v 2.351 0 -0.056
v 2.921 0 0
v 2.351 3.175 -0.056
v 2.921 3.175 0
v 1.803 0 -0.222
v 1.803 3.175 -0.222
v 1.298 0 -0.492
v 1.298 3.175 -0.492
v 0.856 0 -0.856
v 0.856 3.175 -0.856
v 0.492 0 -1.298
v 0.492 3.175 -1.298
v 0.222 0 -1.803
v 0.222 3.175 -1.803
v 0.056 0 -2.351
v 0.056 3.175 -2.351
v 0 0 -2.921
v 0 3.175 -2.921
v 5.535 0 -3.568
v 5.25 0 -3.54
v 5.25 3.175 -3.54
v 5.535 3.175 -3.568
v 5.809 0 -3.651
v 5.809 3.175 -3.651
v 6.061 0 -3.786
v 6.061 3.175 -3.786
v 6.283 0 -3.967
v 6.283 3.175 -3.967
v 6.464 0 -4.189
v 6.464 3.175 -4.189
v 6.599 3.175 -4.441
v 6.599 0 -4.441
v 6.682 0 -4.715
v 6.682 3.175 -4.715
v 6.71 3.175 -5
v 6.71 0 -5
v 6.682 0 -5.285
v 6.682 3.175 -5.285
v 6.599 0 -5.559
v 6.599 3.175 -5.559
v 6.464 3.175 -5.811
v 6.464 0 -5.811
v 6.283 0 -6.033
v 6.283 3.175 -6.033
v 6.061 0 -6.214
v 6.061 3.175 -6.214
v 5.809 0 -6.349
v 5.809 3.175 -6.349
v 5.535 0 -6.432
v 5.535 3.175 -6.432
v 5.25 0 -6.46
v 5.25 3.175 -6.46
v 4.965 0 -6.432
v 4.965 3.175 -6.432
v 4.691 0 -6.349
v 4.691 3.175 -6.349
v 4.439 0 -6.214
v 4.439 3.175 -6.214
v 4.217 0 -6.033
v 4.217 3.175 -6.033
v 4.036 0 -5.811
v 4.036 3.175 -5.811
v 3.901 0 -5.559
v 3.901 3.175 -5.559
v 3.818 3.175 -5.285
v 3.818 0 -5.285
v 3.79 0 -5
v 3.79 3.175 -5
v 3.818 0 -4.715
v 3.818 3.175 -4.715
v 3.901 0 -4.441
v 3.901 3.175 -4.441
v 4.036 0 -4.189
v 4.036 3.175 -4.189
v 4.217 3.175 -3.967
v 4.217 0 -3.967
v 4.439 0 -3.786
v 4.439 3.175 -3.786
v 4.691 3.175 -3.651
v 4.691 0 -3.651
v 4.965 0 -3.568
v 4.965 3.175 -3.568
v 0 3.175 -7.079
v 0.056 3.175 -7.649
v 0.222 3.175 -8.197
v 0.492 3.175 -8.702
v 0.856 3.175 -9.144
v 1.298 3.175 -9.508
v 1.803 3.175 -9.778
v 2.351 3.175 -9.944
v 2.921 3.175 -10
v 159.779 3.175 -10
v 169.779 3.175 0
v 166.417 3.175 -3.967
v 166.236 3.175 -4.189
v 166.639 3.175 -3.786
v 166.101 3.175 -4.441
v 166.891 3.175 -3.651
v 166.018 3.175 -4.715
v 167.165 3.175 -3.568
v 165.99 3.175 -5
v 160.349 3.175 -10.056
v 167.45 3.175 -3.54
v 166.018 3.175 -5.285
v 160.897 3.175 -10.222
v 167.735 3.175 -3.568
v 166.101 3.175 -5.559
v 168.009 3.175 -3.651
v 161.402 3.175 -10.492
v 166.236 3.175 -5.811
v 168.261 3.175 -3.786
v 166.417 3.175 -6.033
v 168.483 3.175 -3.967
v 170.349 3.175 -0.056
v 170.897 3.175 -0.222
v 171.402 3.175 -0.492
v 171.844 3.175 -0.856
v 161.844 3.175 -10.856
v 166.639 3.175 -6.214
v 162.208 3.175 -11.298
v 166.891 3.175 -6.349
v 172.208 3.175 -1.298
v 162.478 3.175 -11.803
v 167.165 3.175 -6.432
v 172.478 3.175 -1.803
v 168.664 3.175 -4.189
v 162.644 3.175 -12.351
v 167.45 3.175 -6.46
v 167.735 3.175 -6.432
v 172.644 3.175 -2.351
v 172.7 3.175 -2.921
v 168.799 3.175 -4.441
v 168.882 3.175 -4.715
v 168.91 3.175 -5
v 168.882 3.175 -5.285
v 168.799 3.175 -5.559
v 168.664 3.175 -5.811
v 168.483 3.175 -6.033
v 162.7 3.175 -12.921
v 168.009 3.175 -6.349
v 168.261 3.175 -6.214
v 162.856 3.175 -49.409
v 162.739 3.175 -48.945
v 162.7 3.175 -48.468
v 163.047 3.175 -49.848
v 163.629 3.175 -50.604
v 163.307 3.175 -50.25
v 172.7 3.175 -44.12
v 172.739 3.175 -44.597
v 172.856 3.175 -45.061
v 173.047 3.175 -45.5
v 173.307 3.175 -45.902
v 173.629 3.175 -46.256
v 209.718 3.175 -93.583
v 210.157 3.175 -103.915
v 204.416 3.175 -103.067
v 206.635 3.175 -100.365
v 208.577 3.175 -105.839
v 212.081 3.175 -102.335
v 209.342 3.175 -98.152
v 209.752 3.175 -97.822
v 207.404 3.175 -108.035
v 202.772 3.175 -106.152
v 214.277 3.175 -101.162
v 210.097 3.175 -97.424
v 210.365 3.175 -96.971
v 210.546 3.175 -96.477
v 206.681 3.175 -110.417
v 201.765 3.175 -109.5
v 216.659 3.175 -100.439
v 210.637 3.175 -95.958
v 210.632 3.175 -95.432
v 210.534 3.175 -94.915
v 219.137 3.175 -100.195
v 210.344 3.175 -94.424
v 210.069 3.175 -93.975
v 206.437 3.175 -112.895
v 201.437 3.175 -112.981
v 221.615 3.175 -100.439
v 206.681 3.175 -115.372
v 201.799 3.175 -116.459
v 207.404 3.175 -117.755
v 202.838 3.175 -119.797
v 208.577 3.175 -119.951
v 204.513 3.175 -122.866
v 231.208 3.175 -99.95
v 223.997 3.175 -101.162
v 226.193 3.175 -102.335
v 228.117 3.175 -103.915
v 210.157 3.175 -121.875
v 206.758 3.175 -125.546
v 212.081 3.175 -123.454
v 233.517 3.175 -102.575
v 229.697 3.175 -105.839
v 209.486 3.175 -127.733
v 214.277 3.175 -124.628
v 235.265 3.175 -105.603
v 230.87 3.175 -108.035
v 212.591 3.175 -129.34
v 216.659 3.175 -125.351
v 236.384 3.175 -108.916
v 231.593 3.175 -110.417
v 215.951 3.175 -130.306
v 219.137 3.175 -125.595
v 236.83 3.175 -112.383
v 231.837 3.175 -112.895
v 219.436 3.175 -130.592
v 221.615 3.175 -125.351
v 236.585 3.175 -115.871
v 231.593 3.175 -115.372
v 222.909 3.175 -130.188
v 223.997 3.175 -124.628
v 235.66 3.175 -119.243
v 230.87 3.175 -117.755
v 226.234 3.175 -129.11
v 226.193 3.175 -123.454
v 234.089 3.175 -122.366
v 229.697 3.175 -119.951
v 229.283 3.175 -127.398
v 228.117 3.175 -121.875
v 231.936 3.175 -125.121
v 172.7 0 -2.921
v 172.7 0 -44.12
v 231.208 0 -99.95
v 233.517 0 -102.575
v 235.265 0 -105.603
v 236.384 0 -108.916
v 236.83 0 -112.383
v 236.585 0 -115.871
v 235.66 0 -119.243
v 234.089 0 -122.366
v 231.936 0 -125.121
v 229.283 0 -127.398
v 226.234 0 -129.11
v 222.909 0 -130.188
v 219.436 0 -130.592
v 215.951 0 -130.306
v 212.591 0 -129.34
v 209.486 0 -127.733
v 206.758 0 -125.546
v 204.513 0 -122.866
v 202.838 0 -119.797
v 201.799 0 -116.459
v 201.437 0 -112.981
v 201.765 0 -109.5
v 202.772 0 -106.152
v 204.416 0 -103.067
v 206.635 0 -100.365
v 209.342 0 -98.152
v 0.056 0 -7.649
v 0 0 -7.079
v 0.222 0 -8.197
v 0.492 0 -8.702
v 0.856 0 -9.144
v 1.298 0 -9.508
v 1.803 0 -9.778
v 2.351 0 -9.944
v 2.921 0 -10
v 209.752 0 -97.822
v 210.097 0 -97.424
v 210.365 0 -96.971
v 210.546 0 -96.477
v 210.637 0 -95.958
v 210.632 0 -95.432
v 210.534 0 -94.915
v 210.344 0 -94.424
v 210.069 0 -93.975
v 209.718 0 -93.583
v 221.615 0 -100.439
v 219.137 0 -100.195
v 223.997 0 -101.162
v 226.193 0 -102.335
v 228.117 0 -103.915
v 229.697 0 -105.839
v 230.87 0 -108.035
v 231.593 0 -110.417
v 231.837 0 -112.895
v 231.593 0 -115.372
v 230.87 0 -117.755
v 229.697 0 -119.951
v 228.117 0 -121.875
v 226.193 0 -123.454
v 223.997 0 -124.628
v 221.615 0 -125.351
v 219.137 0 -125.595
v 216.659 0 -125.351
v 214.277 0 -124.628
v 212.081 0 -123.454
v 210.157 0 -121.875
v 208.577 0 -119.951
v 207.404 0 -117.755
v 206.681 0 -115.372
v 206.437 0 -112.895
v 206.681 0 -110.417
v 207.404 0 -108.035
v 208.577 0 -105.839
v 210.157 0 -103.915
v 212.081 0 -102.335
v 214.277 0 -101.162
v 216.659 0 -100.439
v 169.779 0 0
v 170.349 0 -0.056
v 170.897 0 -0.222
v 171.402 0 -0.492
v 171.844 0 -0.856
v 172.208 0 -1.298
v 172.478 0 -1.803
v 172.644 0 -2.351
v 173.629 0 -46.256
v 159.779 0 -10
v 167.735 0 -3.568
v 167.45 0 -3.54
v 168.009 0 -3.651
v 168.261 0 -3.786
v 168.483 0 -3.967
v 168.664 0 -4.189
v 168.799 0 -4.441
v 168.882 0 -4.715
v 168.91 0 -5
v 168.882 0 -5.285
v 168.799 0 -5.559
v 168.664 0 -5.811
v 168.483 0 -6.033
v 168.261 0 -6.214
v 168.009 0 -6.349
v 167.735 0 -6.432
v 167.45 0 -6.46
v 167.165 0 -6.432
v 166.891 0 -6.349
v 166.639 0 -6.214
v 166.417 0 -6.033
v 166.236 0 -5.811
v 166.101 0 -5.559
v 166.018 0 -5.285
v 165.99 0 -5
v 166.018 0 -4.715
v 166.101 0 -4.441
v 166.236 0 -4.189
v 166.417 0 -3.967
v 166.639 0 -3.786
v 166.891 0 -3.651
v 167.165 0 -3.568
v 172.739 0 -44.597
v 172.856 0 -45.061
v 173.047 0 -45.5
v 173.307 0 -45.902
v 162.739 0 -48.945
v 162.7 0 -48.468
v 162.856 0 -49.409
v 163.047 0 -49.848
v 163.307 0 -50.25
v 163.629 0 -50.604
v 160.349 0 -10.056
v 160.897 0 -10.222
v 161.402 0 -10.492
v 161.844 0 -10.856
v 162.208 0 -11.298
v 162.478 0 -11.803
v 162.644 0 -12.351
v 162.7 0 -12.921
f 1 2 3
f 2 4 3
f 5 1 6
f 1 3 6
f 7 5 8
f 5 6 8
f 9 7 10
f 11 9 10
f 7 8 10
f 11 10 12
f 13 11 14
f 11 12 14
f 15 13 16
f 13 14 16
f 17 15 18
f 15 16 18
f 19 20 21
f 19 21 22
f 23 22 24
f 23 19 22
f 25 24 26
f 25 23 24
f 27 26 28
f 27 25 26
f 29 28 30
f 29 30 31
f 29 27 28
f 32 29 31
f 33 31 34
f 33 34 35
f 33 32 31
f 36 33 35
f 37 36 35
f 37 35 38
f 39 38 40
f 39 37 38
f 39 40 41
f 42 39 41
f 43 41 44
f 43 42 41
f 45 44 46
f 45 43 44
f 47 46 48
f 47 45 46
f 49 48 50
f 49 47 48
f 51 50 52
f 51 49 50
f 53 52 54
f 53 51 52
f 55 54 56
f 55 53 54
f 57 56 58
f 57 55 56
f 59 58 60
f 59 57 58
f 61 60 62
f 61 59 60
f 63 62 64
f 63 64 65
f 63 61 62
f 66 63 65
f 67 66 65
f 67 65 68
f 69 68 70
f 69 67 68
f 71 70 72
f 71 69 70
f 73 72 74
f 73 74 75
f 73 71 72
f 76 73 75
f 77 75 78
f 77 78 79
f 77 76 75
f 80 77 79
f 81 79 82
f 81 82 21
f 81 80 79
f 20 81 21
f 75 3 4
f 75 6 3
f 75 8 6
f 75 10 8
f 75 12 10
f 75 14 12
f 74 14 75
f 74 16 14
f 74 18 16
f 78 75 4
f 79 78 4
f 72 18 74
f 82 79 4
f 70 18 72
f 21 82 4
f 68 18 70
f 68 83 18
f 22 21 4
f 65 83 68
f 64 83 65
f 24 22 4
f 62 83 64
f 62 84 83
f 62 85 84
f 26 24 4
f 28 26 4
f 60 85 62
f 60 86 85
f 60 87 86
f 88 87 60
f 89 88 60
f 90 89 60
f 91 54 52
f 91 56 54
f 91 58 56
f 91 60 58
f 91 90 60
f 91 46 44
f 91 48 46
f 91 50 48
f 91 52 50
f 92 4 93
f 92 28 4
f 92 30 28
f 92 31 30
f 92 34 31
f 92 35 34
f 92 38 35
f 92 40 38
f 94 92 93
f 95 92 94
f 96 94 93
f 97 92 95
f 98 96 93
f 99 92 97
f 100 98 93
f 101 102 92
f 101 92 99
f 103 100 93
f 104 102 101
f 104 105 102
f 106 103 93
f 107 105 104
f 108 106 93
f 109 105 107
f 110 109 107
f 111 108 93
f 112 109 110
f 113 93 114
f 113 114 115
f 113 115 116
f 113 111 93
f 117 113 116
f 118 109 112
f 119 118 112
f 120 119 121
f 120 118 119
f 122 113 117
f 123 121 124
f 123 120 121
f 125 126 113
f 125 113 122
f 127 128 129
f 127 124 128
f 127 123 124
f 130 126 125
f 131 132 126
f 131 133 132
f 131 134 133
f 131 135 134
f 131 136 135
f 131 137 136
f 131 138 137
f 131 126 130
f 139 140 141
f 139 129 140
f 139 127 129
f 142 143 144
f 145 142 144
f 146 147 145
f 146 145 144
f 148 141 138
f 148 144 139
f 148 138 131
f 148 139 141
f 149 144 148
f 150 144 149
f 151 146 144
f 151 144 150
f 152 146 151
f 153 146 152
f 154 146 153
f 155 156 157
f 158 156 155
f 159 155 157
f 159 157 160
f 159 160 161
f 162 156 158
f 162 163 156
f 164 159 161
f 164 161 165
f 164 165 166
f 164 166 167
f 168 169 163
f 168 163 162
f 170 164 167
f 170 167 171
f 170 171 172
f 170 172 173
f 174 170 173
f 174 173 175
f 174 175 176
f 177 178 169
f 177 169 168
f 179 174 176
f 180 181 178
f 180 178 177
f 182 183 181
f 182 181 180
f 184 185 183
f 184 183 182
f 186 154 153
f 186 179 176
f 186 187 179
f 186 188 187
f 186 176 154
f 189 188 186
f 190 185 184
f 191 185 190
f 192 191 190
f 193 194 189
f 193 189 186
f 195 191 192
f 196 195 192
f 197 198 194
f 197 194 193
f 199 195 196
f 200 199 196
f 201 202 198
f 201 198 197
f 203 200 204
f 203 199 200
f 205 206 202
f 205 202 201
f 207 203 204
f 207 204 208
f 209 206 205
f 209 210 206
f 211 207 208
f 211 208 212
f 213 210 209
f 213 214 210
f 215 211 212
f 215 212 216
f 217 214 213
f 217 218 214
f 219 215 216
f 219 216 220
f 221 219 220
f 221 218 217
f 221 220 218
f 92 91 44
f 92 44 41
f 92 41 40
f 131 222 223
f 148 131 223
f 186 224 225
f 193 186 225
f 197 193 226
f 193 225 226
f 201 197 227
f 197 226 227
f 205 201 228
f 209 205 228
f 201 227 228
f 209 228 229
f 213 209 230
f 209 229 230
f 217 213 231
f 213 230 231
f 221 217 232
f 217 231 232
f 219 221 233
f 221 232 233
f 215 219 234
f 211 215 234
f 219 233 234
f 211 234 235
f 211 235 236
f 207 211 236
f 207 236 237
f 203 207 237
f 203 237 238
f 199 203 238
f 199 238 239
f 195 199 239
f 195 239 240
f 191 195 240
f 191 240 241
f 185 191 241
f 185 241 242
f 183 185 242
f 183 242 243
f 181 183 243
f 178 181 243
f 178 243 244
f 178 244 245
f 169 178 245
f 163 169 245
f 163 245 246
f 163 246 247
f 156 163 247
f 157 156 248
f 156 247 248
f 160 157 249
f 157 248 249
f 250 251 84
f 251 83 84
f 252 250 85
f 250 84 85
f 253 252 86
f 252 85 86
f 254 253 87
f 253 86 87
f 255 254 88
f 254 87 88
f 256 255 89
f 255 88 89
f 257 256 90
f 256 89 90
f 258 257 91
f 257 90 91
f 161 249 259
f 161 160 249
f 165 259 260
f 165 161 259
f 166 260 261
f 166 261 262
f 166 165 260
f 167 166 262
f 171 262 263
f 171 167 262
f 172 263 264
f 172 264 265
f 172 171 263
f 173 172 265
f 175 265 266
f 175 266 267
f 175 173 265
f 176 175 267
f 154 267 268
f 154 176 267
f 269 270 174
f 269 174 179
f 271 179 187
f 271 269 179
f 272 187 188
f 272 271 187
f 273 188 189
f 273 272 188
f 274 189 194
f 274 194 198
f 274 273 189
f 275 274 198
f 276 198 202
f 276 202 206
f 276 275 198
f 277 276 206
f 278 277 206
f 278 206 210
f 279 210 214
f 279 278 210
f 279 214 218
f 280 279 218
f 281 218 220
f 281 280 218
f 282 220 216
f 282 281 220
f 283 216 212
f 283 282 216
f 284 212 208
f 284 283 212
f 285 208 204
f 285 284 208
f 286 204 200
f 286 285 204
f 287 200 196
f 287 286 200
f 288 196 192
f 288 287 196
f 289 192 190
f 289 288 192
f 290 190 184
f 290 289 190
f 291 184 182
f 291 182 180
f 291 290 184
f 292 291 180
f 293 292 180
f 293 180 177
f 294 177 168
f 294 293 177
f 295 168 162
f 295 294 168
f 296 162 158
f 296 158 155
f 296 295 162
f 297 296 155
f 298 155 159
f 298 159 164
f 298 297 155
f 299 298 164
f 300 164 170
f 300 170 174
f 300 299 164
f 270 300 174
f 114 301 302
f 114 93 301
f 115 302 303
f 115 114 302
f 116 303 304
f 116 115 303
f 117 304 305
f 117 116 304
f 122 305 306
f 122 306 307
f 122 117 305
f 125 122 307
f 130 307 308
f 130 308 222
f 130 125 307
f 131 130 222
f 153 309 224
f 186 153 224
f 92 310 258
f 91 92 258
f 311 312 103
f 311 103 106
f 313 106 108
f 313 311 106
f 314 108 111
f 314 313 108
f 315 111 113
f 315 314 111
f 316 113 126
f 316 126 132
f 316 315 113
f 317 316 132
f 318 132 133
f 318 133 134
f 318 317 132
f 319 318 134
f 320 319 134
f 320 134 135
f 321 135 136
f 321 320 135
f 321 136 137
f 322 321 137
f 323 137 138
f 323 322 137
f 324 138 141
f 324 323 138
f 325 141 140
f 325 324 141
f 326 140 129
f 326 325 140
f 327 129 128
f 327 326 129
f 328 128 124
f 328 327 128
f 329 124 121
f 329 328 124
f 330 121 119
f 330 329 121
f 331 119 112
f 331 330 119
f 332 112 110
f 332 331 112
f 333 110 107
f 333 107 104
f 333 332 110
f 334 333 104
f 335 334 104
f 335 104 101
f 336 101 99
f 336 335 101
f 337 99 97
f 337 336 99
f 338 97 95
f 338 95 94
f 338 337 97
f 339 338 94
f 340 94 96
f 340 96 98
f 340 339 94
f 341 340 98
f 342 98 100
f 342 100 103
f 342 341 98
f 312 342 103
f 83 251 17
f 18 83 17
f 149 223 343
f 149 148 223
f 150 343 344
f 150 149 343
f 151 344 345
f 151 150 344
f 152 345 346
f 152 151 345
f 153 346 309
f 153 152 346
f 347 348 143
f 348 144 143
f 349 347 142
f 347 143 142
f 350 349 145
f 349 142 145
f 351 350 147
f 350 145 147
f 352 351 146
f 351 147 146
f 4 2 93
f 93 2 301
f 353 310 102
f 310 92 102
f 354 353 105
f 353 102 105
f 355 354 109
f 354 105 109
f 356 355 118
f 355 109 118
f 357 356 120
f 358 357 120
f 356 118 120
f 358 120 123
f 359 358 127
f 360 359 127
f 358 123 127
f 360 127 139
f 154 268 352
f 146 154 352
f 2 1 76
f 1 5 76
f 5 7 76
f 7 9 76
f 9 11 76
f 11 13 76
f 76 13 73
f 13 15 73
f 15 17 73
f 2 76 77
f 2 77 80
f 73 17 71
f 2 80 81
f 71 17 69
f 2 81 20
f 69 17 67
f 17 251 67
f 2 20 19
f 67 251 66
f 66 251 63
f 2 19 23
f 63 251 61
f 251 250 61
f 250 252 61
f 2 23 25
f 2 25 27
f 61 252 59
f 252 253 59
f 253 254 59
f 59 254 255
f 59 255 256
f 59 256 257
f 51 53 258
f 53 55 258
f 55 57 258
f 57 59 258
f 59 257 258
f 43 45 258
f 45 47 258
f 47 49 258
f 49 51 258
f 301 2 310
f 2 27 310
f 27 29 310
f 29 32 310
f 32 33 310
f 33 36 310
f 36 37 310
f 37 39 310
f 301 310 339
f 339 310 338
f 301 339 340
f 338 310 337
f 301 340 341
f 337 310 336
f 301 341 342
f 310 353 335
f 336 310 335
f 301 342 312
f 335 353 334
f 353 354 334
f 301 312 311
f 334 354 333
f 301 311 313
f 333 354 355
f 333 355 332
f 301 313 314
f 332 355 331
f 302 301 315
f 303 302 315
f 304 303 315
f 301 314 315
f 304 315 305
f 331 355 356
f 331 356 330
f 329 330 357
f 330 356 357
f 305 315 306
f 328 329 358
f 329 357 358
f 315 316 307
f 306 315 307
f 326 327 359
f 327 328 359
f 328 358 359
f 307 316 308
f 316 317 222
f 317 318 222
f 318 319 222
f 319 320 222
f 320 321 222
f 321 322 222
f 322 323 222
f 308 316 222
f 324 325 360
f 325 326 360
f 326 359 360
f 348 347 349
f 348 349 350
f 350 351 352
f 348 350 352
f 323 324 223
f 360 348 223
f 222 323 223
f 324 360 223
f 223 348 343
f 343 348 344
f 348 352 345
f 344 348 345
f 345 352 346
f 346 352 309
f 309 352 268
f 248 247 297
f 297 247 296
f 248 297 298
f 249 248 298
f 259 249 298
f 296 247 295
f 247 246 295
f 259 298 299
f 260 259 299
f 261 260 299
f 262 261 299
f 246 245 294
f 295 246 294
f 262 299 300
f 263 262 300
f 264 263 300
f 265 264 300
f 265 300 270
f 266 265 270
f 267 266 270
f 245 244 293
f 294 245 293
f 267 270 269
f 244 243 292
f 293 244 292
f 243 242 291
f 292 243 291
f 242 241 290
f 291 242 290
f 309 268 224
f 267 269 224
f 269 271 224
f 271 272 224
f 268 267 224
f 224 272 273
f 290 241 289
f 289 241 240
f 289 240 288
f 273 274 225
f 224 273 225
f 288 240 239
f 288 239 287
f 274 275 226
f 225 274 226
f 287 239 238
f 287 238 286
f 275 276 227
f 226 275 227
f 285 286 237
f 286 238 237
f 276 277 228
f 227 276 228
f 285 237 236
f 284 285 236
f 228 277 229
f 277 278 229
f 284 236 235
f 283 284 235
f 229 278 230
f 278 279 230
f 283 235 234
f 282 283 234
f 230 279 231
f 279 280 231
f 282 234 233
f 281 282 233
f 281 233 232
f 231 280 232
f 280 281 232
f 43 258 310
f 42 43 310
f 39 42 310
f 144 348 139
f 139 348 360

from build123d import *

# Parameters (mm, degrees)
SKETCH1_R           = 1.4605
SKETCH1_R_2         = 12.7
BOSS_EXTRUDE1_DEPTH = 3.175
FILLET1_R           = 2.921


with BuildPart() as part:
    # Sketch1 → Boss-Extrude1 (new body)
    with BuildSketch(Plane(origin=(0, 0, 0), x_dir=(1, 0, 0), z_dir=(0, 1, 0))):
        with BuildLine():
            Line((0, 0), (172.7, 0))
            Line((172.7, 0), (172.7, 45.39))
            Line((172.7, 45.39), (231.20829613, 99.949868805))
            ThreePointArc((231.20829613, 99.949868805), (215.791893749, 130.275875463), (212.732452536, 96.394140536))
            Line((212.732452536, 96.394140536), (162.7, 49.73812375))
            Line((162.7, 49.73812375), (162.7, 10))
            Line((162.7, 10), (0, 10))
            Line((0, 10), (0, 0))
        make_face()
        with Locations(Location((5.25, 5, 0), (0, 0, 270))):
            Circle(SKETCH1_R, mode=Mode.SUBTRACT)
        with Locations(Location((167.45, 5, 0), (0, 0, 270))):
            Circle(SKETCH1_R, mode=Mode.SUBTRACT)
        with Locations(Location((219.136925156, 112.894829324, 0), (0, 0, 270))):
            Circle(SKETCH1_R_2, mode=Mode.SUBTRACT)
    extrude(amount=BOSS_EXTRUDE1_DEPTH)

    # Fillet1
    fillet1_edges = [part.edges().sort_by_distance(p)[0] for p in [
        (0, 1.5875, -10),
        (162.7, 1.5875, -10),
        (162.7, 1.5875, -49.73812375),
        (212.732452536, 1.5875, -96.394140536),
        (172.7, 1.5875, -45.39),
        (172.7, 1.5875, 0),
        (0, 1.5875, 0),
    ]]
    fillet(fillet1_edges, radius=FILLET1_R)


solid = part.part
